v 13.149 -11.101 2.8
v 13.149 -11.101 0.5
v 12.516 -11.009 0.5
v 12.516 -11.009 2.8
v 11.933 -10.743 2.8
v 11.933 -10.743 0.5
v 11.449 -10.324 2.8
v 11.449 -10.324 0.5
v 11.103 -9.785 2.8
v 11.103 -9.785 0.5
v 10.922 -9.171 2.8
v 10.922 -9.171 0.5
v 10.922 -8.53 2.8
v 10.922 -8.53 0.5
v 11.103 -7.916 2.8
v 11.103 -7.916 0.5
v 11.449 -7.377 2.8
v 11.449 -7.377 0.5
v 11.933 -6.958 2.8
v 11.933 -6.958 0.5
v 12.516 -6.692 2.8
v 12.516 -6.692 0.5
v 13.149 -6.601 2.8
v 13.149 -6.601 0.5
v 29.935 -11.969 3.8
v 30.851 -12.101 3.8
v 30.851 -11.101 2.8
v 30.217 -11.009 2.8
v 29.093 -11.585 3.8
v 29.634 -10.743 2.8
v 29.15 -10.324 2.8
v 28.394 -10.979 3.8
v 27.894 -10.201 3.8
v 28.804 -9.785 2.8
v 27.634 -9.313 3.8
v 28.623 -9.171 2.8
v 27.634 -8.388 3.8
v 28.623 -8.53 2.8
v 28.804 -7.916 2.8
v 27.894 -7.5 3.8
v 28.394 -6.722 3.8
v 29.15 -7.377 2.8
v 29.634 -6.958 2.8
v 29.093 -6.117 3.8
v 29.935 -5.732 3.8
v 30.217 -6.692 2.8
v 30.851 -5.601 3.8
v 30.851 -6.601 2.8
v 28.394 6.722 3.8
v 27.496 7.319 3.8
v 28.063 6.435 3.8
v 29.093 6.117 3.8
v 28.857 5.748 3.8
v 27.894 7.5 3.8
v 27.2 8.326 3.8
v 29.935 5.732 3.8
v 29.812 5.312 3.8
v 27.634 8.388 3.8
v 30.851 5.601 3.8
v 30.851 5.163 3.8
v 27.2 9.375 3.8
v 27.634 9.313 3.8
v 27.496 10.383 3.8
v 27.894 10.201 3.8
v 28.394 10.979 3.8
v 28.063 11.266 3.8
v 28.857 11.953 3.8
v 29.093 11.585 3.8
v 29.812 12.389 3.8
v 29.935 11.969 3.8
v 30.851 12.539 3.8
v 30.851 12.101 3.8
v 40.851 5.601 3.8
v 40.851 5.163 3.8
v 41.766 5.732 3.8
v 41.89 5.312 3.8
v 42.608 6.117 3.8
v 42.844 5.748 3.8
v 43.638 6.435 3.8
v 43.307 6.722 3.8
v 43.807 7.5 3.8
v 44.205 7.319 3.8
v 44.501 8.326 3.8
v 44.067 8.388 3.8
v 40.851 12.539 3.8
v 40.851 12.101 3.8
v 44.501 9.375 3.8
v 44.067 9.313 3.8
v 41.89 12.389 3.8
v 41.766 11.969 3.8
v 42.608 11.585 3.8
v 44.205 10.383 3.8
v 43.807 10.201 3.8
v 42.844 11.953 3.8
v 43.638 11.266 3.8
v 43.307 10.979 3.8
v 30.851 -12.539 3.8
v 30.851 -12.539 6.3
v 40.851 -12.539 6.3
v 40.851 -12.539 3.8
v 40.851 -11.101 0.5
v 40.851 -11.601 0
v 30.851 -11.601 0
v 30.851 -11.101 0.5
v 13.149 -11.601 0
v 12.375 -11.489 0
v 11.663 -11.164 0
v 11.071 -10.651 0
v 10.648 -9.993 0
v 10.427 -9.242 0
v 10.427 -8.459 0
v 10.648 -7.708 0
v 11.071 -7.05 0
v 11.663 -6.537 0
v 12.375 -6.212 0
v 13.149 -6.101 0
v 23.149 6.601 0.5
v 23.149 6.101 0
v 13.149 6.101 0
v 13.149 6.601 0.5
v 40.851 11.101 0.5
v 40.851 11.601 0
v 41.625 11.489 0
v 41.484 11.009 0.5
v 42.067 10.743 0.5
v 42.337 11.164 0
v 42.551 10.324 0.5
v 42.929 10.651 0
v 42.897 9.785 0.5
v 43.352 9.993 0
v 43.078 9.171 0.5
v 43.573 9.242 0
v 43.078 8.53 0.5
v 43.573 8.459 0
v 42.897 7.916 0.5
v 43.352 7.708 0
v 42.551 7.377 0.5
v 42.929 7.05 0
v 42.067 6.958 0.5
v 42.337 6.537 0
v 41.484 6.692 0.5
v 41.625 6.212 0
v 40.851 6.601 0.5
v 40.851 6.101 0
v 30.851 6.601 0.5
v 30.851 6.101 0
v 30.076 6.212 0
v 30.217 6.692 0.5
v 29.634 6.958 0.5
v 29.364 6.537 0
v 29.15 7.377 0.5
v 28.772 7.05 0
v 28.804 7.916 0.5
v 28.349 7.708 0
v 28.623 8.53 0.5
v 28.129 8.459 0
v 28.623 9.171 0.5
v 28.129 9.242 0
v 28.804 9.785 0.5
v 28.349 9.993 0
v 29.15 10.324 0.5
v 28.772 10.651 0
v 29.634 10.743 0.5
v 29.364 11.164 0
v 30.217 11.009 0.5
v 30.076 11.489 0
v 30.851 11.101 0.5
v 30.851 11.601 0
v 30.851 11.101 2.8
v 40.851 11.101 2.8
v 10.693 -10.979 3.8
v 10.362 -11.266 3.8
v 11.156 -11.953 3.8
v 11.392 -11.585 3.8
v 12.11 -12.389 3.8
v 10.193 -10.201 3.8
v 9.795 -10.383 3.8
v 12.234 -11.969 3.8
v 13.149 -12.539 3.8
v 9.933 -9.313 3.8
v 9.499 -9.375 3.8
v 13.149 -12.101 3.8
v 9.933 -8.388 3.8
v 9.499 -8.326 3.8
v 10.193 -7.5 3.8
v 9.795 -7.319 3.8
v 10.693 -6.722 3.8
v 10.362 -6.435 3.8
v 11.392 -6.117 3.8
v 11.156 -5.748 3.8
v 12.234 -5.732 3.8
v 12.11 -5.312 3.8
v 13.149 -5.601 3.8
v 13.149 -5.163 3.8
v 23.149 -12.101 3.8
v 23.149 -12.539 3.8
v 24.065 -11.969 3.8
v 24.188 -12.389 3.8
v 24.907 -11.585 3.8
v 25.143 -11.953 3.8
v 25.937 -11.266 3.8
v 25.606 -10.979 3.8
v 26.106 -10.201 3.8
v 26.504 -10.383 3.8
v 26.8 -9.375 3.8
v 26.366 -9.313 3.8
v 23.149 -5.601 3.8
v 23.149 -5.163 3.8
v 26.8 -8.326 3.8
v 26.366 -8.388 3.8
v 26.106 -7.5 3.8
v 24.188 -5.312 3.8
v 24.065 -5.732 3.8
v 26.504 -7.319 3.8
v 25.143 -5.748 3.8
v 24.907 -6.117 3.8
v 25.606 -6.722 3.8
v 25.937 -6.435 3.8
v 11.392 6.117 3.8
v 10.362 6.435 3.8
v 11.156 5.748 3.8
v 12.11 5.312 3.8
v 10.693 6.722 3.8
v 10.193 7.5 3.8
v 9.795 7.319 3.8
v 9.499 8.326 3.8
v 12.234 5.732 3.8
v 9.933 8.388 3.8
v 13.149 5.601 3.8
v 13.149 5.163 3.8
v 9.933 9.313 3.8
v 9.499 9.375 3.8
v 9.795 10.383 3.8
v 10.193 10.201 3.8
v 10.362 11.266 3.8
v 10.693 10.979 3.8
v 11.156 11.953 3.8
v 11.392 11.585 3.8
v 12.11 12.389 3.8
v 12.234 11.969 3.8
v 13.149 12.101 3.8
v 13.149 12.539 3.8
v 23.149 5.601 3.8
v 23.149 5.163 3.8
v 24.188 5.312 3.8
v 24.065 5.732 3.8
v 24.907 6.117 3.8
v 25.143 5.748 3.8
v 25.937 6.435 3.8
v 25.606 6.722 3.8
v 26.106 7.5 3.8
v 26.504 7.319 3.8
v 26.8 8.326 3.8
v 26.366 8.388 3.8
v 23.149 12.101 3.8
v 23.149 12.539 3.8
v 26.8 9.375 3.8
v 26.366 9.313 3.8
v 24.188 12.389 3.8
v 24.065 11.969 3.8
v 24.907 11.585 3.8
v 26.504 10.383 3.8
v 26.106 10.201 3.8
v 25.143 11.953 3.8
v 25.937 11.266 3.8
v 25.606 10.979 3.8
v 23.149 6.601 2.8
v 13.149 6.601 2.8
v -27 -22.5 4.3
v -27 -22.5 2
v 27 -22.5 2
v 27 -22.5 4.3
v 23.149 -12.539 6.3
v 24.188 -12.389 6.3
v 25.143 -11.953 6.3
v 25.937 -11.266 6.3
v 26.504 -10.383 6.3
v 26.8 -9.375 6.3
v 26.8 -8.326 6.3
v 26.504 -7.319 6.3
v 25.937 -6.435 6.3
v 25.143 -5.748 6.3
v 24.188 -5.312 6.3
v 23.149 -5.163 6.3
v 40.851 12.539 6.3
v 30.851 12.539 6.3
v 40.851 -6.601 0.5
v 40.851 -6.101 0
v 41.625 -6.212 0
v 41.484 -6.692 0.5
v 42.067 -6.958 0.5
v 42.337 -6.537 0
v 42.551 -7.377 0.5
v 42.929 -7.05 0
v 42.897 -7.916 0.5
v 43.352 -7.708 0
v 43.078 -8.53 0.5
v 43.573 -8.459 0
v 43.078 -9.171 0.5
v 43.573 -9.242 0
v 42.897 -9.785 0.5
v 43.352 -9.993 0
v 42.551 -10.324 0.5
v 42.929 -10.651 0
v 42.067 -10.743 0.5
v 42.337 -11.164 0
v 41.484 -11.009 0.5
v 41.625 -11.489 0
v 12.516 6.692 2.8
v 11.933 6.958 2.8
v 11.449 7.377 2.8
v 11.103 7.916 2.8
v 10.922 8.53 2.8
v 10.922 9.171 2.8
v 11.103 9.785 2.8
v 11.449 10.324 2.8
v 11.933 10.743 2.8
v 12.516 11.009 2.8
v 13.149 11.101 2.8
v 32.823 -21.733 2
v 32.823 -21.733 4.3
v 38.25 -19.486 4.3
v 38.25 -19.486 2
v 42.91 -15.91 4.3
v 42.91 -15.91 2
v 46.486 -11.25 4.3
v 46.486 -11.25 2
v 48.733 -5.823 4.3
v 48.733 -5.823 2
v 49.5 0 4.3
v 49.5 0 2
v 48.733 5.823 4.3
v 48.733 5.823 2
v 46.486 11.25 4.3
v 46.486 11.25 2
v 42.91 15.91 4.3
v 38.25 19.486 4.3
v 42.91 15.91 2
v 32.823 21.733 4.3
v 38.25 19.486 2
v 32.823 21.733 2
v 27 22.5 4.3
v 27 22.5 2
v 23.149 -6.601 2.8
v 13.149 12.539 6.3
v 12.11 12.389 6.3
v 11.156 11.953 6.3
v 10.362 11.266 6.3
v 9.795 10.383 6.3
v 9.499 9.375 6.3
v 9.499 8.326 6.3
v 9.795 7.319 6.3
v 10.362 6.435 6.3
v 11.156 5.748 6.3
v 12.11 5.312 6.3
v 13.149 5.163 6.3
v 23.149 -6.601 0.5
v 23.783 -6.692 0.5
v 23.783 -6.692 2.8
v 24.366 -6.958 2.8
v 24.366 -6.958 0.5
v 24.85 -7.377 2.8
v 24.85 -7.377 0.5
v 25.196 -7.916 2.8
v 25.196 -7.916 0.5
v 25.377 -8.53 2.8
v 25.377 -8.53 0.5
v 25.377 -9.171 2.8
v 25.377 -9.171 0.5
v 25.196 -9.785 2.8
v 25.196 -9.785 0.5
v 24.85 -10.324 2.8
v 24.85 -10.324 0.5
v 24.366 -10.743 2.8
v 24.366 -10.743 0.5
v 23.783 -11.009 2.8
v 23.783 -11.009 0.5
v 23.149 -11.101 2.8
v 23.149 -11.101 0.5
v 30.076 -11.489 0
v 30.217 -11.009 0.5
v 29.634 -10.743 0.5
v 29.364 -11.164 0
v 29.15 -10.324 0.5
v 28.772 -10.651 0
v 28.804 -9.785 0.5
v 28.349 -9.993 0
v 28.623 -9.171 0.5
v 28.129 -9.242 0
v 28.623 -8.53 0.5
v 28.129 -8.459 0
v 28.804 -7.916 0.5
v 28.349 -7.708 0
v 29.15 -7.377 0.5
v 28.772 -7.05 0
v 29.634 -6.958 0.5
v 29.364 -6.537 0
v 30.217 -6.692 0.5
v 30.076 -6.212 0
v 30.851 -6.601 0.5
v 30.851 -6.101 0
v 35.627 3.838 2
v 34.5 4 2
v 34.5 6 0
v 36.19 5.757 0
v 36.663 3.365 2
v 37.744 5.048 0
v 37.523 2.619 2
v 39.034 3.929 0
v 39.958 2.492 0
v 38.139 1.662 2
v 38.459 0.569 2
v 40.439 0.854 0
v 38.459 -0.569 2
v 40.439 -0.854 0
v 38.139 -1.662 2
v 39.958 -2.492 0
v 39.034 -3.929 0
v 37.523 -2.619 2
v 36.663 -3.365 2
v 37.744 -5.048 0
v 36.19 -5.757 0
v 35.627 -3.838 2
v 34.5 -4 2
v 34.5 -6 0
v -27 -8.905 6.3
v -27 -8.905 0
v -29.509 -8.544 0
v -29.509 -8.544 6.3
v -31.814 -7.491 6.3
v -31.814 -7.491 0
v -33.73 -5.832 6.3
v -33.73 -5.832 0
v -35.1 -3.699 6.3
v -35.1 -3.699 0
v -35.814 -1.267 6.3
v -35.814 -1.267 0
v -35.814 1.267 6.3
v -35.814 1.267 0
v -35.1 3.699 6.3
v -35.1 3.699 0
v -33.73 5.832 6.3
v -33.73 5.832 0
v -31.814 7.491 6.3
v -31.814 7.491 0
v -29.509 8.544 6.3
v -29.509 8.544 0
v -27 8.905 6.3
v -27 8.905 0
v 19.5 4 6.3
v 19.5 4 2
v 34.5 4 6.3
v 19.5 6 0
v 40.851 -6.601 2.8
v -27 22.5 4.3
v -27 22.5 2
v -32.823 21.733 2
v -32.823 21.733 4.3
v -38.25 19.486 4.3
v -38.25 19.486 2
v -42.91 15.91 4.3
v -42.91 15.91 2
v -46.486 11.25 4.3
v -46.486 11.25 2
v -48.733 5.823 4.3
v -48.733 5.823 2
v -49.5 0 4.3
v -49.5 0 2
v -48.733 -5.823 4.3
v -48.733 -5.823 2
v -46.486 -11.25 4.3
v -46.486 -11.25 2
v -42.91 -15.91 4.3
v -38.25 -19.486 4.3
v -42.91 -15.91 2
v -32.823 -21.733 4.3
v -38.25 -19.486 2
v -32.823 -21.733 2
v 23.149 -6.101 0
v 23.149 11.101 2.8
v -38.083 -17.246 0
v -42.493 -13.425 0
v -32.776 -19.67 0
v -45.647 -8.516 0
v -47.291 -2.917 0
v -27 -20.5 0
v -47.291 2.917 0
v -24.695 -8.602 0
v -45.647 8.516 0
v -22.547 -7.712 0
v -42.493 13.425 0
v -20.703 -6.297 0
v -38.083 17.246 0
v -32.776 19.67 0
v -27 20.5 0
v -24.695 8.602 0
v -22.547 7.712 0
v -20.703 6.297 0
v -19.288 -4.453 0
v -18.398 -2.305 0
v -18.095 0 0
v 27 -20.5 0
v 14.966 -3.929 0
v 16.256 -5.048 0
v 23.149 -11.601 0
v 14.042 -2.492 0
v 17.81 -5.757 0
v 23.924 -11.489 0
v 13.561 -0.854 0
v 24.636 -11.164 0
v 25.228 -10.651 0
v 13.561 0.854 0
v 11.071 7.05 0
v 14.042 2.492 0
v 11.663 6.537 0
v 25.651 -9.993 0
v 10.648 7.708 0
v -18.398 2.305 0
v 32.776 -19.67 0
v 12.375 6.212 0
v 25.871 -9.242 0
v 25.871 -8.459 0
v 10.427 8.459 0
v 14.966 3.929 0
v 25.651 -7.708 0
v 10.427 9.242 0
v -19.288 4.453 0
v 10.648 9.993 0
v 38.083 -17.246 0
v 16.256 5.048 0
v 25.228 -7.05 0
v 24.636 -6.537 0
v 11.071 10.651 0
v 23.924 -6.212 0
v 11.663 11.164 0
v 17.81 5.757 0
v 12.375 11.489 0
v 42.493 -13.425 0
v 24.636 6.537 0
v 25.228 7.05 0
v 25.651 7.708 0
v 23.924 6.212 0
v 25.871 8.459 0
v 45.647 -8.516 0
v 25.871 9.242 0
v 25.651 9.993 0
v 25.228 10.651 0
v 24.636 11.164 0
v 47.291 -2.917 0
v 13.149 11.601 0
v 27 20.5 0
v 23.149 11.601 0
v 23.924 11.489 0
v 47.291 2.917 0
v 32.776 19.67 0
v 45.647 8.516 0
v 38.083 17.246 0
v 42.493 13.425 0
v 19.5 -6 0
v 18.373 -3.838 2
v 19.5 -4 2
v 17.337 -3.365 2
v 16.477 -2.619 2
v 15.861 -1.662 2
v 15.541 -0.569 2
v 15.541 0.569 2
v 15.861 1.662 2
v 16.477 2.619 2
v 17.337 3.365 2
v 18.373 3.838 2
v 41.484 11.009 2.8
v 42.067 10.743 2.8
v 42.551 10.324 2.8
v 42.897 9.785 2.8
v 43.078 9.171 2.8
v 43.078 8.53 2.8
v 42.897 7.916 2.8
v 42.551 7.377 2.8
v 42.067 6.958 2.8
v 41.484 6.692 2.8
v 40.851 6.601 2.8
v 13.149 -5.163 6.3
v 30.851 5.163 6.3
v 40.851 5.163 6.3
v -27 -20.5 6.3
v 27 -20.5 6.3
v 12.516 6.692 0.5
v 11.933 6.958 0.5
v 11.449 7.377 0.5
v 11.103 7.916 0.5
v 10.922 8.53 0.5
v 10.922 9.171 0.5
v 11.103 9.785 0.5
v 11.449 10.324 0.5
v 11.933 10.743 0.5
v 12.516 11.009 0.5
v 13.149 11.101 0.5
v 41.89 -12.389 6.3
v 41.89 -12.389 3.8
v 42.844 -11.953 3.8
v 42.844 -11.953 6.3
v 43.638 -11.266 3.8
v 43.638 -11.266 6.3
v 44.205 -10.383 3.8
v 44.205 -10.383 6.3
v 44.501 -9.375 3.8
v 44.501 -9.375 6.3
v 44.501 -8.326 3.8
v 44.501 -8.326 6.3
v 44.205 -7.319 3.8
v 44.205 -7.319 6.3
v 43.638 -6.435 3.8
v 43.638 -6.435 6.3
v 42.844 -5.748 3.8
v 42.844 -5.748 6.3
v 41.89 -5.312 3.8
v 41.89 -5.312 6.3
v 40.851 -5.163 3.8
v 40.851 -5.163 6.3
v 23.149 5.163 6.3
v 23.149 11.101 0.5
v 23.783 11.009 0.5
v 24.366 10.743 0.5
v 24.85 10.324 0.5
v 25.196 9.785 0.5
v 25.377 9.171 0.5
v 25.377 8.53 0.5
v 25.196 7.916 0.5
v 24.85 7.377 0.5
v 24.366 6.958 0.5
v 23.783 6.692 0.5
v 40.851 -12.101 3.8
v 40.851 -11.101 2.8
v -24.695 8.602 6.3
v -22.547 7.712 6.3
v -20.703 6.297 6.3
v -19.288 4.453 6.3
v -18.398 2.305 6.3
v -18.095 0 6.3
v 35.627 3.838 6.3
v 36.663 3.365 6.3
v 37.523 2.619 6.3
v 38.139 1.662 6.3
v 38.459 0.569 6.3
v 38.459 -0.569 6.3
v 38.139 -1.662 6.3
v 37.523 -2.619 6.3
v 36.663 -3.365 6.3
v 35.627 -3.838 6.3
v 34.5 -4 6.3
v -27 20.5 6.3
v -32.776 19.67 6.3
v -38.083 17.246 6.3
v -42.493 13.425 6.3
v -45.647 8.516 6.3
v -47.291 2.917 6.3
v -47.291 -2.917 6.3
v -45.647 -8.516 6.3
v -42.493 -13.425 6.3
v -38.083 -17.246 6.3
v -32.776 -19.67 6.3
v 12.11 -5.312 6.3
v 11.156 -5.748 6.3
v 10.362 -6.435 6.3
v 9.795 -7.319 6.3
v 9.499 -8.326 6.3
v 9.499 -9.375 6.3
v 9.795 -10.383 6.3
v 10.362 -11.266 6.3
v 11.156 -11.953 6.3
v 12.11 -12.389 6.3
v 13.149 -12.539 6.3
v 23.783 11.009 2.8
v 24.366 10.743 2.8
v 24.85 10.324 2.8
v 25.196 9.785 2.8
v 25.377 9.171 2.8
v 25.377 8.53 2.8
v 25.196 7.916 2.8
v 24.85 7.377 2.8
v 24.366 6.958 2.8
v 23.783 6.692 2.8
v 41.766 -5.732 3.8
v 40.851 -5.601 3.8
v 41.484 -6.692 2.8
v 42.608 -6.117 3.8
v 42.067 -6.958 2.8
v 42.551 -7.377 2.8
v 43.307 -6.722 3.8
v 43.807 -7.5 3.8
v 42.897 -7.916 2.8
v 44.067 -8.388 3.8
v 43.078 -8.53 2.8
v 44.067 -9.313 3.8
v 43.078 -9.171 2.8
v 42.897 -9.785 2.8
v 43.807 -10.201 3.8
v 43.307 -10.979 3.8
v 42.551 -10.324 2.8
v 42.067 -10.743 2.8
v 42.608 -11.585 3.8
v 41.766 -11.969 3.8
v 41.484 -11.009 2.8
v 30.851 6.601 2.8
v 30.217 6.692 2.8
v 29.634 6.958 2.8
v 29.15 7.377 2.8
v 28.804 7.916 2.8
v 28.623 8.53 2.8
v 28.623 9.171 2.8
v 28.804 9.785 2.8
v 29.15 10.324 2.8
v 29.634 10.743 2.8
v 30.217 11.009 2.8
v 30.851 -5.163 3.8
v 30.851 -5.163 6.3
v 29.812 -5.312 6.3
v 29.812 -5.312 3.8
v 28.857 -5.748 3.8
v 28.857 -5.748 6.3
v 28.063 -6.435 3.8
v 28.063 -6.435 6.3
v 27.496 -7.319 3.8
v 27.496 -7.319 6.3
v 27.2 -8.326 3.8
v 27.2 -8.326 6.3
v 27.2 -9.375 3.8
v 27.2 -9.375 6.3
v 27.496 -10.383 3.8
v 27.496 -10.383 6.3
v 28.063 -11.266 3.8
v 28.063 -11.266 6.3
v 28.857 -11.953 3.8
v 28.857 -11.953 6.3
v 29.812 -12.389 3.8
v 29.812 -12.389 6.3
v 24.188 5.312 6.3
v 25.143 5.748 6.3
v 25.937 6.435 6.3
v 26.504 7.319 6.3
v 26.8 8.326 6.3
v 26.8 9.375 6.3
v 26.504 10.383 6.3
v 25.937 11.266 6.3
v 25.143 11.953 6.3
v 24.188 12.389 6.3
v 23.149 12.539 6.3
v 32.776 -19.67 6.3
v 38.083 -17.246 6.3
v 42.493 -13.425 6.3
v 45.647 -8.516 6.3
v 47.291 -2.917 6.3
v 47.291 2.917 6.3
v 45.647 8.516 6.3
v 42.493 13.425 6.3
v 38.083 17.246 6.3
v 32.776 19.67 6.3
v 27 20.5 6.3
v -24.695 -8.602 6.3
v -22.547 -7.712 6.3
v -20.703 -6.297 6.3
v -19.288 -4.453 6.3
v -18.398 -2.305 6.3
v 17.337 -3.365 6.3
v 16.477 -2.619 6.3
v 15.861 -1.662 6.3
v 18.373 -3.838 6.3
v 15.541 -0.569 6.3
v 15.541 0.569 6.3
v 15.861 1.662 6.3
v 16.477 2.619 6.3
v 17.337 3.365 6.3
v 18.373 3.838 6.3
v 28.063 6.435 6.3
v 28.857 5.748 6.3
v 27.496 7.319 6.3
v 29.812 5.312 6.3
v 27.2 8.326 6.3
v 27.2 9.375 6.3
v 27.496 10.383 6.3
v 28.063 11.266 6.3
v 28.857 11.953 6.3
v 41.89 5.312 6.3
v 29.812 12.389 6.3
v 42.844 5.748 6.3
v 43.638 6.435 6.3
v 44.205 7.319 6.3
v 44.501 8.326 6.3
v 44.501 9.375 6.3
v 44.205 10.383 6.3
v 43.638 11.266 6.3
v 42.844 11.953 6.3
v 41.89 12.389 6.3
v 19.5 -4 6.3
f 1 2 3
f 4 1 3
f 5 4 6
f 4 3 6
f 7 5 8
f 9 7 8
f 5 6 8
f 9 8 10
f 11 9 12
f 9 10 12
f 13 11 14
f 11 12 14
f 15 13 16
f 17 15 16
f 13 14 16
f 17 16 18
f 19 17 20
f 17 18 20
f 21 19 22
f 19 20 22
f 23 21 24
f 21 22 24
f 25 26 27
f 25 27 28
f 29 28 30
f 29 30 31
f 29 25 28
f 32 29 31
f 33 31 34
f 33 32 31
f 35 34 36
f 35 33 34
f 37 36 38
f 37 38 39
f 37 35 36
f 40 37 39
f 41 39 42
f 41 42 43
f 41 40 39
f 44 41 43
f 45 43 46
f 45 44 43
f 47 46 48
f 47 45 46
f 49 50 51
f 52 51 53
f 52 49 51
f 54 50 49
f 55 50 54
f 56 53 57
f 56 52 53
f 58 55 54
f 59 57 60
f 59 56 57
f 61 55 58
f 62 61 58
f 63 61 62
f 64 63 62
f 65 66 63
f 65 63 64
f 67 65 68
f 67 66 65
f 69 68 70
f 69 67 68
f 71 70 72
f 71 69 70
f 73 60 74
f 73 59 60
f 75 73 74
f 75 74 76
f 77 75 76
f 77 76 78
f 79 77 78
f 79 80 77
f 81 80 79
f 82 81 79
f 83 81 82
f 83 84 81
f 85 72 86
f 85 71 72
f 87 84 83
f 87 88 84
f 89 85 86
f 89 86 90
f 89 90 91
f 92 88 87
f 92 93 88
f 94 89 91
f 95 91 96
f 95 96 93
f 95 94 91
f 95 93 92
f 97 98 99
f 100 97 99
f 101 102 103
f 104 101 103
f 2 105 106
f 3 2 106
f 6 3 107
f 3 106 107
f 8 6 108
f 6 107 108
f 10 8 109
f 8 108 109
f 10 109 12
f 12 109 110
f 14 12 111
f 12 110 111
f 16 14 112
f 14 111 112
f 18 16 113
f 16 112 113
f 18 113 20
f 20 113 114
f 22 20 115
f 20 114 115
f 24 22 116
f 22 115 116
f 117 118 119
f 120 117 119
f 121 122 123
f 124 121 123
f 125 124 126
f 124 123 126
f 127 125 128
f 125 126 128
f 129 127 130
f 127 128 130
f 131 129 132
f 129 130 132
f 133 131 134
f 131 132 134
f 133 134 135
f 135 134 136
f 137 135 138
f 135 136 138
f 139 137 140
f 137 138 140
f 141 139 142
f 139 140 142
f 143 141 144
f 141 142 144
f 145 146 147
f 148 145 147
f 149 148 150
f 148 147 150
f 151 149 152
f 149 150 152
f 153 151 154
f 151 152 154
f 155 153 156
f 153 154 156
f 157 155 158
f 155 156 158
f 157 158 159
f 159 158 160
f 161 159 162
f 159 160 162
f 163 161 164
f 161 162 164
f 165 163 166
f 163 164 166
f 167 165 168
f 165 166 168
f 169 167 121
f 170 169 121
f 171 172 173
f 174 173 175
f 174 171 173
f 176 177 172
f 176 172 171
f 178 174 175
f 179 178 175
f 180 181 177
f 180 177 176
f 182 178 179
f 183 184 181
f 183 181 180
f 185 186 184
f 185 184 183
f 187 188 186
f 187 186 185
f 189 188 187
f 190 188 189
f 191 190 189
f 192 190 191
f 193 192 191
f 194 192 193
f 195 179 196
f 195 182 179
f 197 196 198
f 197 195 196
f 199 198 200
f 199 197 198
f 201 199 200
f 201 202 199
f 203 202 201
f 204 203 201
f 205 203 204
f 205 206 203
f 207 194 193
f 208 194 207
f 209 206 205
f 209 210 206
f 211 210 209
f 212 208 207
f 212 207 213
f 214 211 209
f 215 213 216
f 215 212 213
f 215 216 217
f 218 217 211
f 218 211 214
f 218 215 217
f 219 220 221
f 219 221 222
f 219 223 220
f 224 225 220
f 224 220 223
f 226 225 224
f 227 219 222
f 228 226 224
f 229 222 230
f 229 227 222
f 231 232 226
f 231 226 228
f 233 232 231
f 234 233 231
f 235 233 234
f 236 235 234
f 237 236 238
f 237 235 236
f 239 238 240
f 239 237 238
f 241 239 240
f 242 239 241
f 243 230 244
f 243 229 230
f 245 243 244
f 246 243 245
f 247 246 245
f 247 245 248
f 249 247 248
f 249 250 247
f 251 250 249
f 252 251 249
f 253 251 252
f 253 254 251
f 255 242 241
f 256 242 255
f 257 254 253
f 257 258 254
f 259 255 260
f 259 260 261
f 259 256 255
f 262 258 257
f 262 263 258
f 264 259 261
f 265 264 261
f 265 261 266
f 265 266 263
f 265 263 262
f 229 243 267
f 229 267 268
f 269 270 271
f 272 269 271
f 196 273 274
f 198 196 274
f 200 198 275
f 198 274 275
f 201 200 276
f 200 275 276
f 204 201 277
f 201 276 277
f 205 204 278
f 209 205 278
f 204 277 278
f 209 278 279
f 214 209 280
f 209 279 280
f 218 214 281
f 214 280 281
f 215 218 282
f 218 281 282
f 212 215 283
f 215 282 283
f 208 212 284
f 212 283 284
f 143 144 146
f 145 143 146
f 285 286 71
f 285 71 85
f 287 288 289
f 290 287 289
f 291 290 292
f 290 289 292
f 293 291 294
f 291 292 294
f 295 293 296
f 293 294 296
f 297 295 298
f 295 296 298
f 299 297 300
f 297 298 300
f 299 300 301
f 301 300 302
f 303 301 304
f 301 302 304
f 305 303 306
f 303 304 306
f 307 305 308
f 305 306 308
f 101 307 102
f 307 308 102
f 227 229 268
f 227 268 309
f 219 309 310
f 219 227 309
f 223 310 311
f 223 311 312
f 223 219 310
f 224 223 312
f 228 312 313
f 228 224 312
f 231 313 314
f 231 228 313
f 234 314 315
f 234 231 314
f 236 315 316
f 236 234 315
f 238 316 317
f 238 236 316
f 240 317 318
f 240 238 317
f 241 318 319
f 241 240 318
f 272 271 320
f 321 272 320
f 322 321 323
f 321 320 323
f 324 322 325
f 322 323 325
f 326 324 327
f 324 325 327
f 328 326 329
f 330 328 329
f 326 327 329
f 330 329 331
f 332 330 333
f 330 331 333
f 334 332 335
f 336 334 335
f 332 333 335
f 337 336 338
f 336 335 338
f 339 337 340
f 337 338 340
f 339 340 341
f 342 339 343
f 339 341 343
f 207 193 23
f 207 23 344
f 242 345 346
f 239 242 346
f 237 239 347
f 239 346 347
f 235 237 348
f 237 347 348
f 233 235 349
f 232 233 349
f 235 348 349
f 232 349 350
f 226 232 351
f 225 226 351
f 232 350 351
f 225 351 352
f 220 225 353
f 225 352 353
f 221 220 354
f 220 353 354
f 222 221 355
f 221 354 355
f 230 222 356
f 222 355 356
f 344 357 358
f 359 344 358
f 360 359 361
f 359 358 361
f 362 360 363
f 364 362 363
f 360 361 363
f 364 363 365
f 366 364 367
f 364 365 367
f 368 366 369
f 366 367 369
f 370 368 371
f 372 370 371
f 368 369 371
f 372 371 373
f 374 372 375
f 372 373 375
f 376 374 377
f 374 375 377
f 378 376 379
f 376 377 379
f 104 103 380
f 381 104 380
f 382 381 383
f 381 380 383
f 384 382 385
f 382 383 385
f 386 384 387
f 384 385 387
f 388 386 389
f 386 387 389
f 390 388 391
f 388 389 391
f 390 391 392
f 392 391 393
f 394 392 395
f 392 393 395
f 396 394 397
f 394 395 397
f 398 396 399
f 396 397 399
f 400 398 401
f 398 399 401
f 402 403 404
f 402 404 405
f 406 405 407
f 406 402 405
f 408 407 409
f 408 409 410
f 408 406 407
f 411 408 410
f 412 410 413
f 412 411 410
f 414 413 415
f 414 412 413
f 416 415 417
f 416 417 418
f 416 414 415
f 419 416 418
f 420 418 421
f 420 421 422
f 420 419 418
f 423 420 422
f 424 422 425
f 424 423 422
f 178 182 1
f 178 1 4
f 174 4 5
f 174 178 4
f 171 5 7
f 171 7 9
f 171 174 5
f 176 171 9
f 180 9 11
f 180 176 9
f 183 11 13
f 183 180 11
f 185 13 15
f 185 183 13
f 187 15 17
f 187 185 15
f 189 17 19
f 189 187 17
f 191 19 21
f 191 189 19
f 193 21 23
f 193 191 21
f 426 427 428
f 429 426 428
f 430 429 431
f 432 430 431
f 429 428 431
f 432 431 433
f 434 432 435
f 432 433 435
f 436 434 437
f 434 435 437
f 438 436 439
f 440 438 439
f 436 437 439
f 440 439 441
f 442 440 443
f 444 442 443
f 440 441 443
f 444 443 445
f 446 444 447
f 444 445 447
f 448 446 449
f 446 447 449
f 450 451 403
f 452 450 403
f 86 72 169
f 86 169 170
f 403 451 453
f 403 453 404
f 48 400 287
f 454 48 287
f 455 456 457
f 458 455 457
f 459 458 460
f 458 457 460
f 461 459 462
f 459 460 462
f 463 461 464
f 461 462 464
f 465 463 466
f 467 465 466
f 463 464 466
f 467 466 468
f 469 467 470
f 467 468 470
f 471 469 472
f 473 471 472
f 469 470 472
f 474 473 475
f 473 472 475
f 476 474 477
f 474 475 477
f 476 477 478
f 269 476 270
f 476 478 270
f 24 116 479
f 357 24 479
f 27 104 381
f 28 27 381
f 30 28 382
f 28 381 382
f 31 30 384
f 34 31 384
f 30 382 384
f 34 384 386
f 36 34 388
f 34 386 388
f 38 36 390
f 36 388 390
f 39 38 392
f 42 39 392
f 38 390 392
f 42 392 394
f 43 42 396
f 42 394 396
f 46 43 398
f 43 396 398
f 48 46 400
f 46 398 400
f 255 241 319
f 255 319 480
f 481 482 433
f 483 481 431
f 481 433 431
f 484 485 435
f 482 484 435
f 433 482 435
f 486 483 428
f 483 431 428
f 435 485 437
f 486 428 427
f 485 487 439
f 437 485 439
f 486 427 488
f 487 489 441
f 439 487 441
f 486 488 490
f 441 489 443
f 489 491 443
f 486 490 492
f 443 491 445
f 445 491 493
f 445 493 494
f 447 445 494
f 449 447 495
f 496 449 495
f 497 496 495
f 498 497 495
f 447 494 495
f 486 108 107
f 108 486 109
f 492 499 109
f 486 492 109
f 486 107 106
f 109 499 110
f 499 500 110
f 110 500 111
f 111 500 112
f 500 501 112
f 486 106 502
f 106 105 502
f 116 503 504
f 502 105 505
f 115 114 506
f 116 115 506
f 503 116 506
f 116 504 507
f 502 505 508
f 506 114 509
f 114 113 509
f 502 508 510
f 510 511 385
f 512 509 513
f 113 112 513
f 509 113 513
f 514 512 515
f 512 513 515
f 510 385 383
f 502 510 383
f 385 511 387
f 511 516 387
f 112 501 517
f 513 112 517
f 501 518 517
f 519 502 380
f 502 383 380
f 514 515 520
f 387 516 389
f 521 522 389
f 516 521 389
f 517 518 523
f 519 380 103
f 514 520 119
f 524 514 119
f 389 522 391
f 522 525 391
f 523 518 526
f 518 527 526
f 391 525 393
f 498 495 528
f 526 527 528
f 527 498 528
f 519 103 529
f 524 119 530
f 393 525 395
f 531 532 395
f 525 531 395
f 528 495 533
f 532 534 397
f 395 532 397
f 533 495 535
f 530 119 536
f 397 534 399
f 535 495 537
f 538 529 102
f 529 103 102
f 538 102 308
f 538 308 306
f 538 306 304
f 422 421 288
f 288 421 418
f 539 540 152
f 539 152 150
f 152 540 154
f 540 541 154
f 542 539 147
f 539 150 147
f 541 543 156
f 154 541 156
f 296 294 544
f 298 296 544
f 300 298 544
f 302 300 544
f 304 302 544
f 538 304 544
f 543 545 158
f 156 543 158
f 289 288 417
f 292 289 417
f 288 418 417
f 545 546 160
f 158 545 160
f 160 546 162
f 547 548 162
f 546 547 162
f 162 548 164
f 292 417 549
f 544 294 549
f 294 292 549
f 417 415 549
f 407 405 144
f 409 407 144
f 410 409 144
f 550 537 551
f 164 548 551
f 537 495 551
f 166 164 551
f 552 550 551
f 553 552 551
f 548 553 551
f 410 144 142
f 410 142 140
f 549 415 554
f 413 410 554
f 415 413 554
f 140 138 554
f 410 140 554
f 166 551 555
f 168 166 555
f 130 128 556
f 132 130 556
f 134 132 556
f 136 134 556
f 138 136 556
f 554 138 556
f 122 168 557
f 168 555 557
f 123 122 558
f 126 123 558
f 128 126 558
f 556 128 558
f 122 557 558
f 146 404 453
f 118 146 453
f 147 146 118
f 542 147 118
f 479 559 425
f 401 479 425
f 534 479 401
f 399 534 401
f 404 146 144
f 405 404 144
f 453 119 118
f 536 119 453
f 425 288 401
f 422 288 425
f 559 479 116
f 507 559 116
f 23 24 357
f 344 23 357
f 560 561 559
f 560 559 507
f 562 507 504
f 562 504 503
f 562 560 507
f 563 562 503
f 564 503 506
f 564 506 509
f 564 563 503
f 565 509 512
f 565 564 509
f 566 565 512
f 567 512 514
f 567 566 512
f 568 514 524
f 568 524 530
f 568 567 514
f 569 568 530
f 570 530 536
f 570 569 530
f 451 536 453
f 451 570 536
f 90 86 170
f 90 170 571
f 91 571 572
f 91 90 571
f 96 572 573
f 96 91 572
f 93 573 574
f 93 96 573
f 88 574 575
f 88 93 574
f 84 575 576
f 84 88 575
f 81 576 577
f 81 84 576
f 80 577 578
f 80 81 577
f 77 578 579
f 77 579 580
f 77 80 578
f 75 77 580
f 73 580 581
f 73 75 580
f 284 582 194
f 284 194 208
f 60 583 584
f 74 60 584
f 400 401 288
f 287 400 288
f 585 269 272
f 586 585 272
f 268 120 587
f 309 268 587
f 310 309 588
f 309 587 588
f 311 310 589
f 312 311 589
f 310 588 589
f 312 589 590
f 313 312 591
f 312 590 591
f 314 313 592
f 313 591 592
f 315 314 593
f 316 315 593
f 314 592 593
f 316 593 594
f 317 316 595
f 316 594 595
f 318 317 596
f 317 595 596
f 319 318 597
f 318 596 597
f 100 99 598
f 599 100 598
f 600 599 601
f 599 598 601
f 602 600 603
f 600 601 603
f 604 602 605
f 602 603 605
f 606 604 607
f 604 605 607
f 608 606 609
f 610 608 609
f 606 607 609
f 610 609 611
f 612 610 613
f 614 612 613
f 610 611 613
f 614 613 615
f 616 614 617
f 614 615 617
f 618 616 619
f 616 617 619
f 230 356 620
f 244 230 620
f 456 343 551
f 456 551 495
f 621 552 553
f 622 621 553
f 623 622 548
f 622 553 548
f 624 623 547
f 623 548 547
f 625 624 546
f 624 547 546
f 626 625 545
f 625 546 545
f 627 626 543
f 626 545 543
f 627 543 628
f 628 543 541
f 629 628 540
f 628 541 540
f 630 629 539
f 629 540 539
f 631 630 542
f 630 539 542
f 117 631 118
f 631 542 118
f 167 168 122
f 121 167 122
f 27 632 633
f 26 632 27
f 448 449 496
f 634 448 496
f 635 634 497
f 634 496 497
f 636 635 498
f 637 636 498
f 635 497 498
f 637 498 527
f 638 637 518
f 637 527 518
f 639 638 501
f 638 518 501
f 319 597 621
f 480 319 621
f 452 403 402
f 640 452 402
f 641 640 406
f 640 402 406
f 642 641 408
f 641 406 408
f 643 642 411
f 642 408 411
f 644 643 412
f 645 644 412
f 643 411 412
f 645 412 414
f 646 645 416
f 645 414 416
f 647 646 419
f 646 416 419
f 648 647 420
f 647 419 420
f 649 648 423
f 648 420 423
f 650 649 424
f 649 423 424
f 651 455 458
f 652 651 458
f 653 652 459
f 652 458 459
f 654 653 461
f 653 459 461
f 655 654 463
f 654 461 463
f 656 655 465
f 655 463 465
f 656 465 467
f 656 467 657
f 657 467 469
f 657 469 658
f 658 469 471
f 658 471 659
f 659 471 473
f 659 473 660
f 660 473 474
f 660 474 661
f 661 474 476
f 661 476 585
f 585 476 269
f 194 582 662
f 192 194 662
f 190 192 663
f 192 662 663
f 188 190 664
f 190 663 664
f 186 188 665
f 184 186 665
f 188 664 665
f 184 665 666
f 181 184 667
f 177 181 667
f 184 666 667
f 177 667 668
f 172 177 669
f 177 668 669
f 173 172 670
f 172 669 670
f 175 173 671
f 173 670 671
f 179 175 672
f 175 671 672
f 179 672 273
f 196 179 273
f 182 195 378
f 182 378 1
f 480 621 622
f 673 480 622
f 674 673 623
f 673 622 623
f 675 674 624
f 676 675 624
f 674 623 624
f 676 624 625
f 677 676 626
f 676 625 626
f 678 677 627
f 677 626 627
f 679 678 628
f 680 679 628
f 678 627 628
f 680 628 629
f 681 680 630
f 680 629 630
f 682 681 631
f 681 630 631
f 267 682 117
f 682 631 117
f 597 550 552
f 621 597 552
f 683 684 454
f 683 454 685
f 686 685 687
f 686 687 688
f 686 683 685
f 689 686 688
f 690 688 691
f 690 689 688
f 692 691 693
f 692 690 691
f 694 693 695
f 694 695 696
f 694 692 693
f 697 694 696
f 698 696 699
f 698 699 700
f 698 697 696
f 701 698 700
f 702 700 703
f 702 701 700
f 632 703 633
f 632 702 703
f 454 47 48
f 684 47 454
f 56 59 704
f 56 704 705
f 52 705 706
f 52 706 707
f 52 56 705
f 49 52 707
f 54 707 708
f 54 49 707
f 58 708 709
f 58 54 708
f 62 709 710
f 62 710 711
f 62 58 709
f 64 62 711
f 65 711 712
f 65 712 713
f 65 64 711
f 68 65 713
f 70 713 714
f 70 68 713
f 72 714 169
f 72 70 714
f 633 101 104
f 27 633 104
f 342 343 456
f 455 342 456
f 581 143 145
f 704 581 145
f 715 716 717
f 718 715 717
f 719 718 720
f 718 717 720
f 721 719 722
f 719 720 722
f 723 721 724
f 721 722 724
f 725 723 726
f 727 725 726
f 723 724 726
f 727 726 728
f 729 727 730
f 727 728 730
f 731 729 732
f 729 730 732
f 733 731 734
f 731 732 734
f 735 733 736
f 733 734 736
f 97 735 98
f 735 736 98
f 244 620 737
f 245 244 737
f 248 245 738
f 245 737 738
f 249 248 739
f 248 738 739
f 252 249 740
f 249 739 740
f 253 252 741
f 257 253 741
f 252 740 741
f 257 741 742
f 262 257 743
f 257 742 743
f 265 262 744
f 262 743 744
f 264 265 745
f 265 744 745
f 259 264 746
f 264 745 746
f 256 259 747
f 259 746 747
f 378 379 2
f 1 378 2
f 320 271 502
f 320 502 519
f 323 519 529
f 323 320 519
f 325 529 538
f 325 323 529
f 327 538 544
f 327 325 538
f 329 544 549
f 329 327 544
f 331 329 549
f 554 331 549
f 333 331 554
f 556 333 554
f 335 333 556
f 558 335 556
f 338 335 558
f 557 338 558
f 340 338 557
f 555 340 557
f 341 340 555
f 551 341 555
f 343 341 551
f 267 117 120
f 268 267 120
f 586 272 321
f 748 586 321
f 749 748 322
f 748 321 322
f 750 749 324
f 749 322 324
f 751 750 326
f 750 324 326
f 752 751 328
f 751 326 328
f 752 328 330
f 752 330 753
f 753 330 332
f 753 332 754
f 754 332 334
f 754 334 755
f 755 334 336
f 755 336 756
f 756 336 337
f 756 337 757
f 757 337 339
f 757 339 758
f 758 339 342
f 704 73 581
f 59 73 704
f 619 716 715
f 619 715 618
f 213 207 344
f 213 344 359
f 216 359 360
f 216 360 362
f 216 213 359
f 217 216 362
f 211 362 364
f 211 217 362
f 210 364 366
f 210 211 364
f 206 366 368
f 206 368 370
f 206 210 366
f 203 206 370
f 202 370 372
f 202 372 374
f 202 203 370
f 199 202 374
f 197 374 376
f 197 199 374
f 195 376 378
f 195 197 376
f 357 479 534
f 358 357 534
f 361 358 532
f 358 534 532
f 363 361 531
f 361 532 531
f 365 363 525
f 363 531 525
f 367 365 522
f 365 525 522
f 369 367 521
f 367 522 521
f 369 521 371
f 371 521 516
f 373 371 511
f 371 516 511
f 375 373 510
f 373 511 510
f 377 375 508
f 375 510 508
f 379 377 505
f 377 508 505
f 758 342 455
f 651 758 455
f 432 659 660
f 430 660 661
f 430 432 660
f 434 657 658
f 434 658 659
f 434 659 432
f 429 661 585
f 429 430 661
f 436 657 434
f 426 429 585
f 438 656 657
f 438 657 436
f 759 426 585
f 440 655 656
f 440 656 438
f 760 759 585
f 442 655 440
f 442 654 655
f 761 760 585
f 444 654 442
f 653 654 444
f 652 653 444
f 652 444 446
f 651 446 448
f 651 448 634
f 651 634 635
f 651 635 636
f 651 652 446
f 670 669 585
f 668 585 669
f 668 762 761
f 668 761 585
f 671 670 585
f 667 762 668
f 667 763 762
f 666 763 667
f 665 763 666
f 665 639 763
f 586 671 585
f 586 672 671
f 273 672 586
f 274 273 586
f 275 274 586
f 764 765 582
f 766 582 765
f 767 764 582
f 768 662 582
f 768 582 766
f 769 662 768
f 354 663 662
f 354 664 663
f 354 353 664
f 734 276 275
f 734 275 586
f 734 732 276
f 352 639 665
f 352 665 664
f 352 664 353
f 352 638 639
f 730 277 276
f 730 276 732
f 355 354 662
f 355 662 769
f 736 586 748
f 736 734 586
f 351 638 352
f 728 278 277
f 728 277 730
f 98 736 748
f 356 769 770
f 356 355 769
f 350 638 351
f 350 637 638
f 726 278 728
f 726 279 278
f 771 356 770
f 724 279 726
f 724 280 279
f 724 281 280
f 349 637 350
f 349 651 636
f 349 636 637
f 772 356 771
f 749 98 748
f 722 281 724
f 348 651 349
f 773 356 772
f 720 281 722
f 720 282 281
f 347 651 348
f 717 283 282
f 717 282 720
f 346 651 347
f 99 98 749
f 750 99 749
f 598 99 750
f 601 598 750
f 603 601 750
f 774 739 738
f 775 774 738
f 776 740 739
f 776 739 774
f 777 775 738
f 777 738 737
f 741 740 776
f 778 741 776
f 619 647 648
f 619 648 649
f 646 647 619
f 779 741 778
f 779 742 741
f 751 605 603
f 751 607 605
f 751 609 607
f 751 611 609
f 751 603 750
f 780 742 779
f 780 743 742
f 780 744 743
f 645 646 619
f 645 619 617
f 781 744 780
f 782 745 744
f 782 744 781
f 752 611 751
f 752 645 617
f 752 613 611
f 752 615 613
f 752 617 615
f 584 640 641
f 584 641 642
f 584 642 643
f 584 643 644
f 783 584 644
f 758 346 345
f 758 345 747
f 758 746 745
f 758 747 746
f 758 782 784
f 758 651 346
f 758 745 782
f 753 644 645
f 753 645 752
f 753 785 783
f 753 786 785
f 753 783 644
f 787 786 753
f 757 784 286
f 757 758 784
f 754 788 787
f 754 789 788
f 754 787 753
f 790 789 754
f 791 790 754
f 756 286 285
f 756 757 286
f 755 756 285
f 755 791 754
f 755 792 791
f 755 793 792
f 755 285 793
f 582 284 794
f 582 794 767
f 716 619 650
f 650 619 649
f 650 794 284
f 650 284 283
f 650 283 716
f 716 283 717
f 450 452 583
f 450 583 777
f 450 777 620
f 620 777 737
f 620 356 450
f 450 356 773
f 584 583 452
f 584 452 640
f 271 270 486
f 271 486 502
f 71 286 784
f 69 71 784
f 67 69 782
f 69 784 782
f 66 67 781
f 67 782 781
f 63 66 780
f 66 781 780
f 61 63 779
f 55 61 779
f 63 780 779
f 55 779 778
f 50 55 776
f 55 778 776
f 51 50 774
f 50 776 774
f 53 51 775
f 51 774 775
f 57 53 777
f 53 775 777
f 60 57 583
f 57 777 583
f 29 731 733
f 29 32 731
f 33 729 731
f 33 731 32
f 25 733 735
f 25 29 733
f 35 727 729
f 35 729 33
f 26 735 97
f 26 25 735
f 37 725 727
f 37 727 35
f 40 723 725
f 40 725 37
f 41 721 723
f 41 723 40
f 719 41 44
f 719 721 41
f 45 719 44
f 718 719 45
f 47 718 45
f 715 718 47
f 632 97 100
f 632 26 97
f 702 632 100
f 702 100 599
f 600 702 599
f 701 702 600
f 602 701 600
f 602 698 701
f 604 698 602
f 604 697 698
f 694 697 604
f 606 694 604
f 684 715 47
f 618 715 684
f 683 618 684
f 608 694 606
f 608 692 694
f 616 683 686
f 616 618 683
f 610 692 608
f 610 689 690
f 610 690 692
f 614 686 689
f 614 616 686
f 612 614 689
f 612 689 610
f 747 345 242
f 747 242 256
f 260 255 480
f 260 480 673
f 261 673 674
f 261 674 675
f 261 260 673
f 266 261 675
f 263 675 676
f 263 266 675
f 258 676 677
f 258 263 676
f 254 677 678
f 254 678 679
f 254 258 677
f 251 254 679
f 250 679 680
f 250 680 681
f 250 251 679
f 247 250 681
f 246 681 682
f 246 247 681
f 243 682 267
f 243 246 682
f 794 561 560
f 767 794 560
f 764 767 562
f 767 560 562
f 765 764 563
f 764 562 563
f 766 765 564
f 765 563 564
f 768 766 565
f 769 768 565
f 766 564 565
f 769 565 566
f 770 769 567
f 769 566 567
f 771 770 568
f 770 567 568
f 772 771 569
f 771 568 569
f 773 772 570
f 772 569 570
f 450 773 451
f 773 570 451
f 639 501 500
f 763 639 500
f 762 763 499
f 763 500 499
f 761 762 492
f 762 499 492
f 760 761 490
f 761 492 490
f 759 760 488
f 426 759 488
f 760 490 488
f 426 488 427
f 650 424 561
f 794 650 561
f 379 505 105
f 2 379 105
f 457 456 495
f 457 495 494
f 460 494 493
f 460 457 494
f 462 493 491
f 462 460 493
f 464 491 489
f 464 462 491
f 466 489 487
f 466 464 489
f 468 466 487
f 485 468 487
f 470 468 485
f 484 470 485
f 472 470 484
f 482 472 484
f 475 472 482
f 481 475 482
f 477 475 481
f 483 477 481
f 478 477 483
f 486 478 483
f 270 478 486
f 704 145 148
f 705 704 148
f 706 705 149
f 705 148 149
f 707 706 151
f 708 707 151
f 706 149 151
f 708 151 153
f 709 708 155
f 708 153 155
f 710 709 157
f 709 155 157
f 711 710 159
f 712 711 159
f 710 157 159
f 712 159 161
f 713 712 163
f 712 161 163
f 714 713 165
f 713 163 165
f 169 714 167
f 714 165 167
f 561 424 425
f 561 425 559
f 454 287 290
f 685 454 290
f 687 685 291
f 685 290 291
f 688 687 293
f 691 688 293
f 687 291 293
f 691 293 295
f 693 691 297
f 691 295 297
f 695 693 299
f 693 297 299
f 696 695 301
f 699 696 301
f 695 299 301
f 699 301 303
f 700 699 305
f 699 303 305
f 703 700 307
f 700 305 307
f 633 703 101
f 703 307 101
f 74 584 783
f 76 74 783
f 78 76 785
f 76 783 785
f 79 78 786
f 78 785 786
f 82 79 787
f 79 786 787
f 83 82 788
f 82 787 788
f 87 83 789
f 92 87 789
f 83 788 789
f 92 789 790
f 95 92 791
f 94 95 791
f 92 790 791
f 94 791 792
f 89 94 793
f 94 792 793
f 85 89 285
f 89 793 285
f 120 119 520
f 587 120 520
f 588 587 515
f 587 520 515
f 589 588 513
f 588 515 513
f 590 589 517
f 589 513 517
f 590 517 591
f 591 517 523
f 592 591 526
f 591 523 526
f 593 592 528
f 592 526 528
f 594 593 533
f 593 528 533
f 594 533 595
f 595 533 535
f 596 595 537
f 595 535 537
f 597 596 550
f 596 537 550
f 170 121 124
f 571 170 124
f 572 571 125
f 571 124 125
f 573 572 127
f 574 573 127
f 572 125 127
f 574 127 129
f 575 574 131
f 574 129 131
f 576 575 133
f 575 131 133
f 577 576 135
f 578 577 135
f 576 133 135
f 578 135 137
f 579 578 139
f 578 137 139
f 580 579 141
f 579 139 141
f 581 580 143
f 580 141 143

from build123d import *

# Parameters (mm, degrees)
F1_DEPTH = 6.3
F2_SIZE  = 0.5
F3_SIZE  = 2
F4_W     = 10
F4_H     = 0.938
F4_H_2   = 5.5
F5_DEPTH = 2.5
F6_SIZE  = 1
F7_SIZE  = 2


# Not quite as in the source:
# - a feature names something its author has since deleted; it is built from what else it names


with BuildPart() as f1:
    # F0 (on Top) → F1 (new body)
    with BuildSketch(Plane.XY):
        with BuildLine():
            ThreePointArc((27, -22.5), (49.5, 0), (27, 22.5))
            Line((27, 22.5), (27, 4))
            Line((27, 4), (34.5, 4))
            ThreePointArc((34.5, 4), (38.5, 0), (34.5, -4))
            Line((34.5, -4), (27, -4))
            Line((27, -4), (27, -22.5))
        make_face()
        with BuildLine():
            ThreePointArc((30.8505792452, -11.1005792452), (28.6005792452, -8.8505792452), (30.8505792452, -6.6005792452))
            Line((30.8505792452, -6.6005792452), (40.8505792452, -6.6005792452))
            ThreePointArc((40.8505792452, -6.6005792452), (43.1005792452, -8.8505792452), (40.8505792452, -11.1005792452))
            Line((40.8505792452, -11.1005792452), (30.8505792452, -11.1005792452))
        make_face(mode=Mode.SUBTRACT)
        with BuildLine():
            ThreePointArc((30.8505792452, 6.6005792452), (28.6005792452, 8.8505792452), (30.8505792452, 11.1005792452))
            Line((30.8505792452, 11.1005792452), (40.8505792452, 11.1005792452))
            ThreePointArc((40.8505792452, 11.1005792452), (43.1005792452, 8.8505792452), (40.8505792452, 6.6005792452))
            Line((40.8505792452, 6.6005792452), (30.8505792452, 6.6005792452))
        make_face(mode=Mode.SUBTRACT)
        with BuildLine():
            Line((27, 4), (27, 22.5))
            Line((27, 22.5), (-27, 22.5))
            Line((-27, 22.5), (-27, 8.905))
            ThreePointArc((-27, 8.905), (-20.7032141135, 6.2967858865), (-18.095, 0))
            ThreePointArc((-18.095, 0), (-20.7032141135, -6.2967858865), (-27, -8.905))
            Line((-27, -8.905), (-27, -22.5))
            Line((-27, -22.5), (27, -22.5))
            Line((27, -22.5), (27, -4))
            Line((27, -4), (19.5, -4))
            ThreePointArc((19.5, -4), (15.5, 0), (19.5, 4))
            Line((19.5, 4), (27, 4))
        make_face()
        with BuildLine():
            Line((23.1494207548, -11.1005792452), (13.1494207548, -11.1005792452))
            ThreePointArc((13.1494207548, -11.1005792452), (10.8994207548, -8.8505792452), (13.1494207548, -6.6005792452))
            Line((13.1494207548, -6.6005792452), (23.1494207548, -6.6005792452))
            ThreePointArc((23.1494207548, -6.6005792452), (25.3994207548, -8.8505792452), (23.1494207548, -11.1005792452))
        make_face(mode=Mode.SUBTRACT)
        with BuildLine():
            ThreePointArc((13.1494207548, 6.6005792452), (10.8994207548, 8.8505792452), (13.1494207548, 11.1005792452))
            Line((13.1494207548, 11.1005792452), (23.1494207548, 11.1005792452))
            ThreePointArc((23.1494207548, 11.1005792452), (25.3994207548, 8.8505792452), (23.1494207548, 6.6005792452))
            Line((23.1494207548, 6.6005792452), (13.1494207548, 6.6005792452))
        make_face(mode=Mode.SUBTRACT)
        with BuildLine():
            Line((-27, 8.905), (-27, 22.5))
            ThreePointArc((-27, 22.5), (-49.5, 0), (-27, -22.5))
            Line((-27, -22.5), (-27, -8.905))
            ThreePointArc((-27, -8.905), (-35.905, 0), (-27, 8.905))
        make_face()
    extrude(amount=F1_DEPTH)

    # F2
    f2_edges = [f1.edges().sort_by_distance(p)[0] for p in [
        (18.149421, 11.100579, 6.3),
        (35.850579, 11.100579, 6.3),
        (35.850579, -6.600579, 6.3),
        (18.149421, -6.600579, 6.3),
        (35.850579, 11.100579, 0),
        (18.149421, 11.100579, 0),
        (35.850579, -6.600579, 0),
        (18.149421, -6.600579, 0),
        (43.100579, -8.850579, 0),
        (35.850579, -11.100579, 0),
        (28.600579, -8.850579, 0),
        (43.100579, 8.850579, 0),
        (35.850579, 6.600579, 0),
        (28.600579, 8.850579, 0),
        (18.149421, 6.600579, 0),
        (10.899421, 8.850579, 0),
        (25.399421, 8.850579, 0),
        (18.149421, -11.100579, 0),
        (10.899421, -8.850579, 0),
        (25.399421, -8.850579, 0),
    ]]
    chamfer(f2_edges, length=F2_SIZE)

    # F3
    f3_edges = [f1.edges().sort_by_distance(p)[0] for p in [
        (0, -22.5, 6.3),
        (0, -22.5, 0),
    ]]
    chamfer(f3_edges, length=F3_SIZE)

    # F4 (on face) → F5 (cut)
    with BuildSketch(Plane.XY.offset(6.3)):
        with Locations((18.1494207548, 12.0695792452)):
            Rectangle(F4_W, F4_H)
        with BuildLine():
            Line((13.1494207548, 11.6005792452), (13.1494207548, 12.5385792452))
            ThreePointArc((13.1494207548, 12.5385792452), (9.4614207548, 8.8505792452), (13.1494207548, 5.1625792452))
            Line((13.1494207548, 5.1625792452), (13.1494207548, 6.1005792452))
            ThreePointArc((13.1494207548, 6.1005792452), (10.3994207548, 8.8505792452), (13.1494207548, 11.6005792452))
        make_face()
        with BuildLine():
            Line((13.1494207548, 6.1005792452), (13.1494207548, 11.6005792452))
            ThreePointArc((13.1494207548, 11.6005792452), (10.3994207548, 8.8505792452), (13.1494207548, 6.1005792452))
        make_face()
        with Locations((18.1494207548, 8.8505792452)):
            Rectangle(F4_W, F4_H_2)
        with Locations((18.1494207548, 5.6315792452)):
            Rectangle(F4_W, F4_H)
        with BuildLine():
            ThreePointArc((23.1494207548, 6.1005792452), (25.8994207548, 8.8505792452), (23.1494207548, 11.6005792452))
            Line((23.1494207548, 11.6005792452), (23.1494207548, 6.1005792452))
        make_face()
        with BuildLine():
            ThreePointArc((23.1494207548, 5.1625792452), (26.8374207548, 8.8505792452), (23.1494207548, 12.5385792452))
            Line((23.1494207548, 12.5385792452), (23.1494207548, 11.6005792452))
            ThreePointArc((23.1494207548, 11.6005792452), (25.8994207548, 8.8505792452), (23.1494207548, 6.1005792452))
            Line((23.1494207548, 6.1005792452), (23.1494207548, 5.1625792452))
        make_face()
        with BuildLine():
            ThreePointArc((30.8505792452, 12.5385792452), (27.1625792452, 8.8505792452), (30.8505792452, 5.1625792452))
            Line((30.8505792452, 5.1625792452), (30.8505792452, 6.1005792452))
            ThreePointArc((30.8505792452, 6.1005792452), (28.1005792452, 8.8505792452), (30.8505792452, 11.6005792452))
            Line((30.8505792452, 11.6005792452), (30.8505792452, 12.5385792452))
        make_face()
        with BuildLine():
            ThreePointArc((30.8505792452, 11.6005792452), (28.1005792452, 8.8505792452), (30.8505792452, 6.1005792452))
            Line((30.8505792452, 6.1005792452), (30.8505792452, 11.6005792452))
        make_face()
        with Locations((35.8505792452, 8.8505792452)):
            Rectangle(F4_W, F4_H_2)
        with Locations((35.8505792452, 12.0695792452)):
            Rectangle(F4_W, F4_H)
        with Locations((35.8505792452, 5.6315792452)):
            Rectangle(F4_W, F4_H)
        with BuildLine():
            Line((40.8505792452, 6.1005792452), (40.8505792452, 5.1625792452))
            ThreePointArc((40.8505792452, 5.1625792452), (44.5385792452, 8.8505792452), (40.8505792452, 12.5385792452))
            Line((40.8505792452, 12.5385792452), (40.8505792452, 11.6005792452))
            ThreePointArc((40.8505792452, 11.6005792452), (43.6005792452, 8.8505792452), (40.8505792452, 6.1005792452))
        make_face()
        with BuildLine():
            Line((40.8505792452, 11.6005792452), (40.8505792452, 6.1005792452))
            ThreePointArc((40.8505792452, 6.1005792452), (43.6005792452, 8.8505792452), (40.8505792452, 11.6005792452))
        make_face()
        with Locations((18.1494207548, -8.8505792452)):
            Rectangle(F4_W, F4_H_2)
        with BuildLine():
            ThreePointArc((13.1494207548, -6.1005792452), (10.3994207548, -8.8505792452), (13.1494207548, -11.6005792452))
            Line((13.1494207548, -11.6005792452), (13.1494207548, -6.1005792452))
        make_face()
        with BuildLine():
            Line((23.1494207548, -6.1005792452), (23.1494207548, -11.6005792452))
            ThreePointArc((23.1494207548, -11.6005792452), (25.8994207548, -8.8505792452), (23.1494207548, -6.1005792452))
        make_face()
        with Locations((18.1494207548, -5.6315792452)):
            Rectangle(F4_W, F4_H)
        with BuildLine():
            Line((23.1494207548, -11.6005792452), (23.1494207548, -12.5385792452))
            ThreePointArc((23.1494207548, -12.5385792452), (26.8374207548, -8.8505792452), (23.1494207548, -5.1625792452))
            Line((23.1494207548, -5.1625792452), (23.1494207548, -6.1005792452))
            ThreePointArc((23.1494207548, -6.1005792452), (25.8994207548, -8.8505792452), (23.1494207548, -11.6005792452))
        make_face()
        with Locations((18.1494207548, -12.0695792452)):
            Rectangle(F4_W, F4_H)
        with BuildLine():
            ThreePointArc((13.1494207548, -5.1625792452), (9.4614207548, -8.8505792452), (13.1494207548, -12.5385792452))
            Line((13.1494207548, -12.5385792452), (13.1494207548, -11.6005792452))
            ThreePointArc((13.1494207548, -11.6005792452), (10.3994207548, -8.8505792452), (13.1494207548, -6.1005792452))
            Line((13.1494207548, -6.1005792452), (13.1494207548, -5.1625792452))
        make_face()
        with BuildLine():
            ThreePointArc((30.8505792452, -5.1625792452), (27.1625792452, -8.8505792452), (30.8505792452, -12.5385792452))
            Line((30.8505792452, -12.5385792452), (30.8505792452, -11.6005792452))
            ThreePointArc((30.8505792452, -11.6005792452), (28.1005792452, -8.8505792452), (30.8505792452, -6.1005792452))
            Line((30.8505792452, -6.1005792452), (30.8505792452, -5.1625792452))
        make_face()
        with Locations((35.8505792452, -5.6315792452)):
            Rectangle(F4_W, F4_H)
        with Locations((35.8505792452, -8.8505792452)):
            Rectangle(F4_W, F4_H_2)
        with Locations((35.8505792452, -12.0695792452)):
            Rectangle(F4_W, F4_H)
        with BuildLine():
            ThreePointArc((30.8505792452, -6.1005792452), (28.1005792452, -8.8505792452), (30.8505792452, -11.6005792452))
            Line((30.8505792452, -11.6005792452), (30.8505792452, -6.1005792452))
        make_face()
        with BuildLine():
            Line((40.8505792452, -6.1005792452), (40.8505792452, -11.6005792452))
            ThreePointArc((40.8505792452, -11.6005792452), (43.6005792452, -8.8505792452), (40.8505792452, -6.1005792452))
        make_face()
        with BuildLine():
            Line((40.8505792452, -11.6005792452), (40.8505792452, -12.5385792452))
            ThreePointArc((40.8505792452, -12.5385792452), (44.5385792452, -8.8505792452), (40.8505792452, -5.1625792452))
            Line((40.8505792452, -5.1625792452), (40.8505792452, -6.1005792452))
            ThreePointArc((40.8505792452, -6.1005792452), (43.6005792452, -8.8505792452), (40.8505792452, -11.6005792452))
        make_face()
    extrude(amount=-F5_DEPTH, mode=Mode.SUBTRACT)

    # F6
    f6_edges = [f1.edges().sort_by_distance(p)[0] for p in [
        (10.899421, 8.850579, 3.8),
        (18.149421, 6.600579, 3.8),
        (25.399421, 8.850579, 3.8),
        (18.149421, 11.100579, 3.8),
        (35.850579, 11.100579, 3.8),
        (28.600579, 8.850579, 3.8),
        (43.100579, 8.850579, 3.8),
        (35.850579, 6.600579, 3.8),
        (35.850579, -6.600579, 3.8),
        (28.600579, -8.850579, 3.8),
        (43.100579, -8.850579, 3.8),
        (35.850579, -11.100579, 3.8),
        (18.149421, -6.600579, 3.8),
        (10.899421, -8.850579, 3.8),
        (25.399421, -8.850579, 3.8),
        (18.149421, -11.100579, 3.8),
    ]]
    chamfer(f6_edges, length=F6_SIZE)

    # F7
    f7_edges = [f1.edges().sort_by_distance(p)[0] for p in [
        (27, 4, 0),
        (38.5, 0, 0),
        (27, -4, 0),
        (15.5, 0, 0),
    ]]
    chamfer(f7_edges, length=F7_SIZE)


solid = f1.part
